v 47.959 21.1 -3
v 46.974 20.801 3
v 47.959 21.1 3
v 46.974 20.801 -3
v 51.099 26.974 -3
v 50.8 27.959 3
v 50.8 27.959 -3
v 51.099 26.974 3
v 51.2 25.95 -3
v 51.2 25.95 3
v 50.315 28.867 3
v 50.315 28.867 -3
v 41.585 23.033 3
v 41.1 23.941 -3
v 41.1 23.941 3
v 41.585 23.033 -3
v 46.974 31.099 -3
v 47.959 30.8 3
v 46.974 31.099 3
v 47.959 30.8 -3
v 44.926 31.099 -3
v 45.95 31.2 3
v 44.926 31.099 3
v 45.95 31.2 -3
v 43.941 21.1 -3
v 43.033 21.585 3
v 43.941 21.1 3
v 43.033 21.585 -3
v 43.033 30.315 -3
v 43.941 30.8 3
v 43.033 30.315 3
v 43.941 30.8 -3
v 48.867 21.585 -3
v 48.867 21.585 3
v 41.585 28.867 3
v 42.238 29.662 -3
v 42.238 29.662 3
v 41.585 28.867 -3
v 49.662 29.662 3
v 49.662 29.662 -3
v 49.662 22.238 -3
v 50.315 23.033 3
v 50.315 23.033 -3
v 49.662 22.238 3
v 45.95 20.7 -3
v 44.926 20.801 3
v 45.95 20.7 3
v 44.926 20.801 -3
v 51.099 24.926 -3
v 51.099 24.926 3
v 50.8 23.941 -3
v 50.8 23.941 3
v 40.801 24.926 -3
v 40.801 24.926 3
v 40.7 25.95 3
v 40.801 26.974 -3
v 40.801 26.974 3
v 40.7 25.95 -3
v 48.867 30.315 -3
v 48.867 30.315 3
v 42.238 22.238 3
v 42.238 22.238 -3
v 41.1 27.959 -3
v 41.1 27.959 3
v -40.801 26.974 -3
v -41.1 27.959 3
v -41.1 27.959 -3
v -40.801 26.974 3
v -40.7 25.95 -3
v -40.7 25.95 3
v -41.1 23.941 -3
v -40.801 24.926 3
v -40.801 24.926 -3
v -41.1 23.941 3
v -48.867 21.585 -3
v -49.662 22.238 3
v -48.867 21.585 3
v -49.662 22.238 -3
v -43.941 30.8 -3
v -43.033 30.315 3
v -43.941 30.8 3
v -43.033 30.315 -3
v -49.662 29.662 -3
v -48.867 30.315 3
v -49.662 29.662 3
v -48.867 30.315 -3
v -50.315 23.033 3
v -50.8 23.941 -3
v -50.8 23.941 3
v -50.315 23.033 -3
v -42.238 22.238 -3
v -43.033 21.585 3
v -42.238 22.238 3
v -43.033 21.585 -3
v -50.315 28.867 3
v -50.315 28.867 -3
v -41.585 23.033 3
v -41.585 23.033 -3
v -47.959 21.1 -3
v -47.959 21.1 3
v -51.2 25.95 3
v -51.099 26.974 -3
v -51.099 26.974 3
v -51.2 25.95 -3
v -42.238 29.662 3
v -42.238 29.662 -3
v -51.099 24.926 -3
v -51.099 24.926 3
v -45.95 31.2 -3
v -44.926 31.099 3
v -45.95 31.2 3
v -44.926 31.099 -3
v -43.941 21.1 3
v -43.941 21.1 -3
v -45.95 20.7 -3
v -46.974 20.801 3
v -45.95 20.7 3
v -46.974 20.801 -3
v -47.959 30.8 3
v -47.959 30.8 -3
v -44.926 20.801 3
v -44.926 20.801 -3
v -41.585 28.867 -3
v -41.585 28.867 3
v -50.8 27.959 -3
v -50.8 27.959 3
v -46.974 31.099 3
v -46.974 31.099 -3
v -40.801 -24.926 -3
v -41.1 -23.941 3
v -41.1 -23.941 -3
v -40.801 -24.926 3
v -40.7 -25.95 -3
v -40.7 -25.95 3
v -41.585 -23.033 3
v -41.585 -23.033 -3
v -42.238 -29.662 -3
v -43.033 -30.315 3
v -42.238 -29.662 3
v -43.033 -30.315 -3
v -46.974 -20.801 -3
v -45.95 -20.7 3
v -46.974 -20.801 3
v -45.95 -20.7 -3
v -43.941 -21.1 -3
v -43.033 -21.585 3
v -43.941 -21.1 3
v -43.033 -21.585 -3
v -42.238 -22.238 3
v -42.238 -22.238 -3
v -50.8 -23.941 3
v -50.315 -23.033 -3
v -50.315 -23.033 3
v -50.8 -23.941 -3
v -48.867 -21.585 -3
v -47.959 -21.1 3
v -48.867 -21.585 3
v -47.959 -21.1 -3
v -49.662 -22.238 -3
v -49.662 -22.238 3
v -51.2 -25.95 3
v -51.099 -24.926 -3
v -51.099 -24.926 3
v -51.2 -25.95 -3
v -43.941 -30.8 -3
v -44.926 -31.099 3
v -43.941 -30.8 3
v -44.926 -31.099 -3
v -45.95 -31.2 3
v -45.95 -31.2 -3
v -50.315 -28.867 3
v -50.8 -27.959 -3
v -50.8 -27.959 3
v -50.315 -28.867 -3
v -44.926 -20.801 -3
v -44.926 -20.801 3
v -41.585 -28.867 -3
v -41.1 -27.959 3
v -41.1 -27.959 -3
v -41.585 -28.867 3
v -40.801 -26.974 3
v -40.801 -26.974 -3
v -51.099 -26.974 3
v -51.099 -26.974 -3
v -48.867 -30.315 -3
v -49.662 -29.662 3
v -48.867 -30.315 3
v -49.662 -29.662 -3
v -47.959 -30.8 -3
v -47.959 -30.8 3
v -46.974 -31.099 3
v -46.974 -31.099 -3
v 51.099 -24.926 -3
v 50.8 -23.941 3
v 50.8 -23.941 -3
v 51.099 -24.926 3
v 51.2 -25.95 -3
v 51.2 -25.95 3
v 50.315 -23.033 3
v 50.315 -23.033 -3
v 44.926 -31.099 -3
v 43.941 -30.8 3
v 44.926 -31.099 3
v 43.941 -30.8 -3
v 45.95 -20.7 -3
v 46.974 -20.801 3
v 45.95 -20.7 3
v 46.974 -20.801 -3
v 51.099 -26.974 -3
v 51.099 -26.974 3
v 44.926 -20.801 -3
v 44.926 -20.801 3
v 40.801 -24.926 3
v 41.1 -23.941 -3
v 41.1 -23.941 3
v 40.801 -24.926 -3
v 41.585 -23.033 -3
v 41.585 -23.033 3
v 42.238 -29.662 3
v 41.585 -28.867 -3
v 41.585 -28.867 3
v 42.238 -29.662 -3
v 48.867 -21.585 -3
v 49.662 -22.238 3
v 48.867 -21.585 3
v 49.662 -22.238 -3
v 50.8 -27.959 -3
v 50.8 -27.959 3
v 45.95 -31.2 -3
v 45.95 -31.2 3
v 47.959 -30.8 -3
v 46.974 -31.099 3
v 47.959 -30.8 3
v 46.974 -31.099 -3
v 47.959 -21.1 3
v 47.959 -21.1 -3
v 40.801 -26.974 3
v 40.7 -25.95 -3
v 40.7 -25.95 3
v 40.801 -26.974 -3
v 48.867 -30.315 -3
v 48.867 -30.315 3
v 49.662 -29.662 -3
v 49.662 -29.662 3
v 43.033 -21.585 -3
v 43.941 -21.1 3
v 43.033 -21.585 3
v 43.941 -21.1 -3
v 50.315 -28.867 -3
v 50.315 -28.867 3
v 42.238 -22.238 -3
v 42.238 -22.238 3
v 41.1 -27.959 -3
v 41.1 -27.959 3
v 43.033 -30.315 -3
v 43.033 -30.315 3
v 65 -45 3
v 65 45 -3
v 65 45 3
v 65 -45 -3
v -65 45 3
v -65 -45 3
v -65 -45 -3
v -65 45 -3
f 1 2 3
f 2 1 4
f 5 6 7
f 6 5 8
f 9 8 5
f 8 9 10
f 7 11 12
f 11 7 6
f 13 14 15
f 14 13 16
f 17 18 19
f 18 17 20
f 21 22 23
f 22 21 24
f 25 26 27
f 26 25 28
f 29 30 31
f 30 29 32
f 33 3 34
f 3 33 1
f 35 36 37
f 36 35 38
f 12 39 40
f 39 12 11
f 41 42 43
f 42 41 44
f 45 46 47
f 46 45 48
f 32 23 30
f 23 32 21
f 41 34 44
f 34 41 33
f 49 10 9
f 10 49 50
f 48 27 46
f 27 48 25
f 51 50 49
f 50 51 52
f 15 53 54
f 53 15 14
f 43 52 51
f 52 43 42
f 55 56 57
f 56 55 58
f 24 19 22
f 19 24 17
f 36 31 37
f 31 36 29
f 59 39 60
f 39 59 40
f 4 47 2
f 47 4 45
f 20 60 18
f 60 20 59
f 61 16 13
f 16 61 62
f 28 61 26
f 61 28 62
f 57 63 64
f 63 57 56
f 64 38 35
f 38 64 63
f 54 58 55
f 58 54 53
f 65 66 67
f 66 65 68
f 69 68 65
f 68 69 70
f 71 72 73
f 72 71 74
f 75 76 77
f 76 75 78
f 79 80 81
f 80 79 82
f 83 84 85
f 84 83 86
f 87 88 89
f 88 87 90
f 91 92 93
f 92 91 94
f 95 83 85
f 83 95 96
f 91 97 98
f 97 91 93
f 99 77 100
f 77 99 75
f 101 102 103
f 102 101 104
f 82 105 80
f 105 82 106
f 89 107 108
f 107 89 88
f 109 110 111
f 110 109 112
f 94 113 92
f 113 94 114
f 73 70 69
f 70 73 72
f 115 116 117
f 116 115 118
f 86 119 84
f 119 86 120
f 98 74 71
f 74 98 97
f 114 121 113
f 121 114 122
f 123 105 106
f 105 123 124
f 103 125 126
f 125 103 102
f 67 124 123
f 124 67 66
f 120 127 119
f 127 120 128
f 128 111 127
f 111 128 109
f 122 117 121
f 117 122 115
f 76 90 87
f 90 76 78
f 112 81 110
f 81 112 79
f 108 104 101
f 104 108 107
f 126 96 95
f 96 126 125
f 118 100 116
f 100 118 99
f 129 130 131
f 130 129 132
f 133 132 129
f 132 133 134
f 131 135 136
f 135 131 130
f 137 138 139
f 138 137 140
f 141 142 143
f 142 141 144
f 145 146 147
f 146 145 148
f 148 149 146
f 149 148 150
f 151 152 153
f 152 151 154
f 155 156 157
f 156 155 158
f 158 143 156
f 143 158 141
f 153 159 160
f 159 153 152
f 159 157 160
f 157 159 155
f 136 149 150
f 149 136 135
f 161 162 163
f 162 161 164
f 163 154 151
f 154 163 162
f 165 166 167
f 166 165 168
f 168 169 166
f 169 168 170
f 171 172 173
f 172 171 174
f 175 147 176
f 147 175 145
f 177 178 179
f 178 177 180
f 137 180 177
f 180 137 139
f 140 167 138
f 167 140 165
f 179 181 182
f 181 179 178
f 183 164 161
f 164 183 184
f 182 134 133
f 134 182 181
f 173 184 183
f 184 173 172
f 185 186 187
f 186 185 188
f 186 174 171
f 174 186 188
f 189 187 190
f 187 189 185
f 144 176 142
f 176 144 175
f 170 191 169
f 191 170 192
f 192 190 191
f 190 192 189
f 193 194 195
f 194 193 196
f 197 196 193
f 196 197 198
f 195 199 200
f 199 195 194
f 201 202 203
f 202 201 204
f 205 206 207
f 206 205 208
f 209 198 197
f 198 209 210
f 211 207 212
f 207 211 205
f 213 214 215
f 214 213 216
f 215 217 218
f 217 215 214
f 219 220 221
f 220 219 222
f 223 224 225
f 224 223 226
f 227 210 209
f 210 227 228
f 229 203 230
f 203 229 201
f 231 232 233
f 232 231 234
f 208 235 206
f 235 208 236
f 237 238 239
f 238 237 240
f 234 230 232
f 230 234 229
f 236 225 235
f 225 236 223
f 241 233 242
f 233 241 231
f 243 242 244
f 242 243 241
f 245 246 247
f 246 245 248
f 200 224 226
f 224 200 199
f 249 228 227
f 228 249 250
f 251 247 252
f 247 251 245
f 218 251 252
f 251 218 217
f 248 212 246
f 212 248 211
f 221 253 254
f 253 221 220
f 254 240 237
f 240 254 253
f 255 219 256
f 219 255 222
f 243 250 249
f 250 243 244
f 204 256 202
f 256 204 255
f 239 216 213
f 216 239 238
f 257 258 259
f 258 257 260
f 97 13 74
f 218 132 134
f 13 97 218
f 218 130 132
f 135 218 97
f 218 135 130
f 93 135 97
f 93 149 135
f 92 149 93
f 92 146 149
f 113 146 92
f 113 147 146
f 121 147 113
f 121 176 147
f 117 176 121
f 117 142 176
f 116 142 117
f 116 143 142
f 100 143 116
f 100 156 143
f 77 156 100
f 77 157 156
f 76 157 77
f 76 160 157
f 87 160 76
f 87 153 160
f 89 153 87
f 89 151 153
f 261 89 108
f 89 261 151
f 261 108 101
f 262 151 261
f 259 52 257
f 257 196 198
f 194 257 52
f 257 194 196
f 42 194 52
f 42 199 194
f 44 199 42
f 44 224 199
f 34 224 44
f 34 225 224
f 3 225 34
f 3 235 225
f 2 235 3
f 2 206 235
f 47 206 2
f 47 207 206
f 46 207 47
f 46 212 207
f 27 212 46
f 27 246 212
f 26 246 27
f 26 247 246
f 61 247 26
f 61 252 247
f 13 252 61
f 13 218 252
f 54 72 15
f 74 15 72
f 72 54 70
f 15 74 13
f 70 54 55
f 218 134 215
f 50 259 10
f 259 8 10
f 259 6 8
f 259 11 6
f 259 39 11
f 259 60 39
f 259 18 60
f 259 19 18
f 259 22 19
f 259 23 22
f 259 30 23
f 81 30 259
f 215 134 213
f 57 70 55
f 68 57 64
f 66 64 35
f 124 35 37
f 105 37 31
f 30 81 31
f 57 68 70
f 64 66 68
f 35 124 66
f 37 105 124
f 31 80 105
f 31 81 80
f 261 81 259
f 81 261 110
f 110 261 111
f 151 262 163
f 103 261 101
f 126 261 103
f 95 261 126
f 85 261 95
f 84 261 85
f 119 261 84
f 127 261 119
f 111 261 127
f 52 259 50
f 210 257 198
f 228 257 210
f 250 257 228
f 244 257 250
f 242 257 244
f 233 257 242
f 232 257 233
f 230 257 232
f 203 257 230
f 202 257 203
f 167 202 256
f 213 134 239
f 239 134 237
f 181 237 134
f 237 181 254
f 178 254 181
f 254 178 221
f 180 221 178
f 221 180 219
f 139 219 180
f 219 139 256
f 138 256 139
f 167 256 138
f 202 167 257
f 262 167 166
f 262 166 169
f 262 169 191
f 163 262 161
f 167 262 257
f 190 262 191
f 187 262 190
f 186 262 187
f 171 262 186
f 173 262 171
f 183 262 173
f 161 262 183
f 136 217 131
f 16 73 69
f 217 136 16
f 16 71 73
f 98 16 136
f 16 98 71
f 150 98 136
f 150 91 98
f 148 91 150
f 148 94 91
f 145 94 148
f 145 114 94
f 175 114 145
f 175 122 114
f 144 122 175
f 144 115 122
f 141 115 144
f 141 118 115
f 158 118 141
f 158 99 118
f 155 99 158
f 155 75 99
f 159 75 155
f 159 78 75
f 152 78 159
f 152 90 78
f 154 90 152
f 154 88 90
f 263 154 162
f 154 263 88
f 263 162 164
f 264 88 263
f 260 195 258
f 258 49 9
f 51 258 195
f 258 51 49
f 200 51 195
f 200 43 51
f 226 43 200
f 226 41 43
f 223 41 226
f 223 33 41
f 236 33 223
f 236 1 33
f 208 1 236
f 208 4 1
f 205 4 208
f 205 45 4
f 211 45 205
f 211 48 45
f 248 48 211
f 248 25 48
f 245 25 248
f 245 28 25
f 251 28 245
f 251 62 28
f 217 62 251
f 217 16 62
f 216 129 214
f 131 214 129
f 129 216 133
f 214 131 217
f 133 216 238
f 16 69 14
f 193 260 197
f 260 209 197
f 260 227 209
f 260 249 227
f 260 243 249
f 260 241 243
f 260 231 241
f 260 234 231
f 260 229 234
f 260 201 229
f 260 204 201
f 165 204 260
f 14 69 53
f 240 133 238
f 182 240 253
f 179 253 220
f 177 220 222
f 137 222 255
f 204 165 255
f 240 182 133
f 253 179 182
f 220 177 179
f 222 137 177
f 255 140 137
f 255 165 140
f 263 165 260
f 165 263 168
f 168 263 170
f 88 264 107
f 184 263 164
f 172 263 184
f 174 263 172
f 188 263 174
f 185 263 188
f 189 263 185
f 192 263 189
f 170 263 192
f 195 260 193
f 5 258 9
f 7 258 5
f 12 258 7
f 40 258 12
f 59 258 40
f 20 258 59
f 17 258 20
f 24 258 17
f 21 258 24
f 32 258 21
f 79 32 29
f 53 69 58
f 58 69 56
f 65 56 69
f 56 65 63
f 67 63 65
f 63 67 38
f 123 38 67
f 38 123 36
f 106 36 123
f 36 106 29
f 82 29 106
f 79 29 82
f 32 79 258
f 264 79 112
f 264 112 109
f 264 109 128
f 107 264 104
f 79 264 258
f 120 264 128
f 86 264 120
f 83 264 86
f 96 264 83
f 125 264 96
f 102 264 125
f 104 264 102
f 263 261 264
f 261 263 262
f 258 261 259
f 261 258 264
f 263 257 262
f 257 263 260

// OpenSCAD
$fn = 32;

// ----------------------------------------------------------------------
// Corner plate 130 x 90 x 6
// 4 holes, centres taken from the edge offset
// ----------------------------------------------------------------------

// --- parameters (mm) ---
plate = [130, 90, 6];  // overall size (x, y, z)
holes = 4;             // number of holes the drawing asks for
hole_d = 10.5;         // hole diameter
edge = 19.05;          // hole centre offset from the plate edge

// --- derived feature positions (mm) ---
corner_x = plate[0] / 2 - edge;  // = 45.95   corner hole X
corner_y = plate[1] / 2 - edge;  // = 25.95   corner hole Y
feature_centers = [
  [corner_x, corner_y],
  [-corner_x, corner_y],
  [-corner_x, -corner_y],
  [corner_x, -corner_y]
];   // hole centres the loop below drills

// plate outline, every hole drilled through with the same cutters
difference() {
  cube(plate, center = true);
  for (centre = feature_centers)
    translate([centre[0], centre[1], 0])
      cylinder(d = hole_d, h = plate[2] + 2, center = true);
}
